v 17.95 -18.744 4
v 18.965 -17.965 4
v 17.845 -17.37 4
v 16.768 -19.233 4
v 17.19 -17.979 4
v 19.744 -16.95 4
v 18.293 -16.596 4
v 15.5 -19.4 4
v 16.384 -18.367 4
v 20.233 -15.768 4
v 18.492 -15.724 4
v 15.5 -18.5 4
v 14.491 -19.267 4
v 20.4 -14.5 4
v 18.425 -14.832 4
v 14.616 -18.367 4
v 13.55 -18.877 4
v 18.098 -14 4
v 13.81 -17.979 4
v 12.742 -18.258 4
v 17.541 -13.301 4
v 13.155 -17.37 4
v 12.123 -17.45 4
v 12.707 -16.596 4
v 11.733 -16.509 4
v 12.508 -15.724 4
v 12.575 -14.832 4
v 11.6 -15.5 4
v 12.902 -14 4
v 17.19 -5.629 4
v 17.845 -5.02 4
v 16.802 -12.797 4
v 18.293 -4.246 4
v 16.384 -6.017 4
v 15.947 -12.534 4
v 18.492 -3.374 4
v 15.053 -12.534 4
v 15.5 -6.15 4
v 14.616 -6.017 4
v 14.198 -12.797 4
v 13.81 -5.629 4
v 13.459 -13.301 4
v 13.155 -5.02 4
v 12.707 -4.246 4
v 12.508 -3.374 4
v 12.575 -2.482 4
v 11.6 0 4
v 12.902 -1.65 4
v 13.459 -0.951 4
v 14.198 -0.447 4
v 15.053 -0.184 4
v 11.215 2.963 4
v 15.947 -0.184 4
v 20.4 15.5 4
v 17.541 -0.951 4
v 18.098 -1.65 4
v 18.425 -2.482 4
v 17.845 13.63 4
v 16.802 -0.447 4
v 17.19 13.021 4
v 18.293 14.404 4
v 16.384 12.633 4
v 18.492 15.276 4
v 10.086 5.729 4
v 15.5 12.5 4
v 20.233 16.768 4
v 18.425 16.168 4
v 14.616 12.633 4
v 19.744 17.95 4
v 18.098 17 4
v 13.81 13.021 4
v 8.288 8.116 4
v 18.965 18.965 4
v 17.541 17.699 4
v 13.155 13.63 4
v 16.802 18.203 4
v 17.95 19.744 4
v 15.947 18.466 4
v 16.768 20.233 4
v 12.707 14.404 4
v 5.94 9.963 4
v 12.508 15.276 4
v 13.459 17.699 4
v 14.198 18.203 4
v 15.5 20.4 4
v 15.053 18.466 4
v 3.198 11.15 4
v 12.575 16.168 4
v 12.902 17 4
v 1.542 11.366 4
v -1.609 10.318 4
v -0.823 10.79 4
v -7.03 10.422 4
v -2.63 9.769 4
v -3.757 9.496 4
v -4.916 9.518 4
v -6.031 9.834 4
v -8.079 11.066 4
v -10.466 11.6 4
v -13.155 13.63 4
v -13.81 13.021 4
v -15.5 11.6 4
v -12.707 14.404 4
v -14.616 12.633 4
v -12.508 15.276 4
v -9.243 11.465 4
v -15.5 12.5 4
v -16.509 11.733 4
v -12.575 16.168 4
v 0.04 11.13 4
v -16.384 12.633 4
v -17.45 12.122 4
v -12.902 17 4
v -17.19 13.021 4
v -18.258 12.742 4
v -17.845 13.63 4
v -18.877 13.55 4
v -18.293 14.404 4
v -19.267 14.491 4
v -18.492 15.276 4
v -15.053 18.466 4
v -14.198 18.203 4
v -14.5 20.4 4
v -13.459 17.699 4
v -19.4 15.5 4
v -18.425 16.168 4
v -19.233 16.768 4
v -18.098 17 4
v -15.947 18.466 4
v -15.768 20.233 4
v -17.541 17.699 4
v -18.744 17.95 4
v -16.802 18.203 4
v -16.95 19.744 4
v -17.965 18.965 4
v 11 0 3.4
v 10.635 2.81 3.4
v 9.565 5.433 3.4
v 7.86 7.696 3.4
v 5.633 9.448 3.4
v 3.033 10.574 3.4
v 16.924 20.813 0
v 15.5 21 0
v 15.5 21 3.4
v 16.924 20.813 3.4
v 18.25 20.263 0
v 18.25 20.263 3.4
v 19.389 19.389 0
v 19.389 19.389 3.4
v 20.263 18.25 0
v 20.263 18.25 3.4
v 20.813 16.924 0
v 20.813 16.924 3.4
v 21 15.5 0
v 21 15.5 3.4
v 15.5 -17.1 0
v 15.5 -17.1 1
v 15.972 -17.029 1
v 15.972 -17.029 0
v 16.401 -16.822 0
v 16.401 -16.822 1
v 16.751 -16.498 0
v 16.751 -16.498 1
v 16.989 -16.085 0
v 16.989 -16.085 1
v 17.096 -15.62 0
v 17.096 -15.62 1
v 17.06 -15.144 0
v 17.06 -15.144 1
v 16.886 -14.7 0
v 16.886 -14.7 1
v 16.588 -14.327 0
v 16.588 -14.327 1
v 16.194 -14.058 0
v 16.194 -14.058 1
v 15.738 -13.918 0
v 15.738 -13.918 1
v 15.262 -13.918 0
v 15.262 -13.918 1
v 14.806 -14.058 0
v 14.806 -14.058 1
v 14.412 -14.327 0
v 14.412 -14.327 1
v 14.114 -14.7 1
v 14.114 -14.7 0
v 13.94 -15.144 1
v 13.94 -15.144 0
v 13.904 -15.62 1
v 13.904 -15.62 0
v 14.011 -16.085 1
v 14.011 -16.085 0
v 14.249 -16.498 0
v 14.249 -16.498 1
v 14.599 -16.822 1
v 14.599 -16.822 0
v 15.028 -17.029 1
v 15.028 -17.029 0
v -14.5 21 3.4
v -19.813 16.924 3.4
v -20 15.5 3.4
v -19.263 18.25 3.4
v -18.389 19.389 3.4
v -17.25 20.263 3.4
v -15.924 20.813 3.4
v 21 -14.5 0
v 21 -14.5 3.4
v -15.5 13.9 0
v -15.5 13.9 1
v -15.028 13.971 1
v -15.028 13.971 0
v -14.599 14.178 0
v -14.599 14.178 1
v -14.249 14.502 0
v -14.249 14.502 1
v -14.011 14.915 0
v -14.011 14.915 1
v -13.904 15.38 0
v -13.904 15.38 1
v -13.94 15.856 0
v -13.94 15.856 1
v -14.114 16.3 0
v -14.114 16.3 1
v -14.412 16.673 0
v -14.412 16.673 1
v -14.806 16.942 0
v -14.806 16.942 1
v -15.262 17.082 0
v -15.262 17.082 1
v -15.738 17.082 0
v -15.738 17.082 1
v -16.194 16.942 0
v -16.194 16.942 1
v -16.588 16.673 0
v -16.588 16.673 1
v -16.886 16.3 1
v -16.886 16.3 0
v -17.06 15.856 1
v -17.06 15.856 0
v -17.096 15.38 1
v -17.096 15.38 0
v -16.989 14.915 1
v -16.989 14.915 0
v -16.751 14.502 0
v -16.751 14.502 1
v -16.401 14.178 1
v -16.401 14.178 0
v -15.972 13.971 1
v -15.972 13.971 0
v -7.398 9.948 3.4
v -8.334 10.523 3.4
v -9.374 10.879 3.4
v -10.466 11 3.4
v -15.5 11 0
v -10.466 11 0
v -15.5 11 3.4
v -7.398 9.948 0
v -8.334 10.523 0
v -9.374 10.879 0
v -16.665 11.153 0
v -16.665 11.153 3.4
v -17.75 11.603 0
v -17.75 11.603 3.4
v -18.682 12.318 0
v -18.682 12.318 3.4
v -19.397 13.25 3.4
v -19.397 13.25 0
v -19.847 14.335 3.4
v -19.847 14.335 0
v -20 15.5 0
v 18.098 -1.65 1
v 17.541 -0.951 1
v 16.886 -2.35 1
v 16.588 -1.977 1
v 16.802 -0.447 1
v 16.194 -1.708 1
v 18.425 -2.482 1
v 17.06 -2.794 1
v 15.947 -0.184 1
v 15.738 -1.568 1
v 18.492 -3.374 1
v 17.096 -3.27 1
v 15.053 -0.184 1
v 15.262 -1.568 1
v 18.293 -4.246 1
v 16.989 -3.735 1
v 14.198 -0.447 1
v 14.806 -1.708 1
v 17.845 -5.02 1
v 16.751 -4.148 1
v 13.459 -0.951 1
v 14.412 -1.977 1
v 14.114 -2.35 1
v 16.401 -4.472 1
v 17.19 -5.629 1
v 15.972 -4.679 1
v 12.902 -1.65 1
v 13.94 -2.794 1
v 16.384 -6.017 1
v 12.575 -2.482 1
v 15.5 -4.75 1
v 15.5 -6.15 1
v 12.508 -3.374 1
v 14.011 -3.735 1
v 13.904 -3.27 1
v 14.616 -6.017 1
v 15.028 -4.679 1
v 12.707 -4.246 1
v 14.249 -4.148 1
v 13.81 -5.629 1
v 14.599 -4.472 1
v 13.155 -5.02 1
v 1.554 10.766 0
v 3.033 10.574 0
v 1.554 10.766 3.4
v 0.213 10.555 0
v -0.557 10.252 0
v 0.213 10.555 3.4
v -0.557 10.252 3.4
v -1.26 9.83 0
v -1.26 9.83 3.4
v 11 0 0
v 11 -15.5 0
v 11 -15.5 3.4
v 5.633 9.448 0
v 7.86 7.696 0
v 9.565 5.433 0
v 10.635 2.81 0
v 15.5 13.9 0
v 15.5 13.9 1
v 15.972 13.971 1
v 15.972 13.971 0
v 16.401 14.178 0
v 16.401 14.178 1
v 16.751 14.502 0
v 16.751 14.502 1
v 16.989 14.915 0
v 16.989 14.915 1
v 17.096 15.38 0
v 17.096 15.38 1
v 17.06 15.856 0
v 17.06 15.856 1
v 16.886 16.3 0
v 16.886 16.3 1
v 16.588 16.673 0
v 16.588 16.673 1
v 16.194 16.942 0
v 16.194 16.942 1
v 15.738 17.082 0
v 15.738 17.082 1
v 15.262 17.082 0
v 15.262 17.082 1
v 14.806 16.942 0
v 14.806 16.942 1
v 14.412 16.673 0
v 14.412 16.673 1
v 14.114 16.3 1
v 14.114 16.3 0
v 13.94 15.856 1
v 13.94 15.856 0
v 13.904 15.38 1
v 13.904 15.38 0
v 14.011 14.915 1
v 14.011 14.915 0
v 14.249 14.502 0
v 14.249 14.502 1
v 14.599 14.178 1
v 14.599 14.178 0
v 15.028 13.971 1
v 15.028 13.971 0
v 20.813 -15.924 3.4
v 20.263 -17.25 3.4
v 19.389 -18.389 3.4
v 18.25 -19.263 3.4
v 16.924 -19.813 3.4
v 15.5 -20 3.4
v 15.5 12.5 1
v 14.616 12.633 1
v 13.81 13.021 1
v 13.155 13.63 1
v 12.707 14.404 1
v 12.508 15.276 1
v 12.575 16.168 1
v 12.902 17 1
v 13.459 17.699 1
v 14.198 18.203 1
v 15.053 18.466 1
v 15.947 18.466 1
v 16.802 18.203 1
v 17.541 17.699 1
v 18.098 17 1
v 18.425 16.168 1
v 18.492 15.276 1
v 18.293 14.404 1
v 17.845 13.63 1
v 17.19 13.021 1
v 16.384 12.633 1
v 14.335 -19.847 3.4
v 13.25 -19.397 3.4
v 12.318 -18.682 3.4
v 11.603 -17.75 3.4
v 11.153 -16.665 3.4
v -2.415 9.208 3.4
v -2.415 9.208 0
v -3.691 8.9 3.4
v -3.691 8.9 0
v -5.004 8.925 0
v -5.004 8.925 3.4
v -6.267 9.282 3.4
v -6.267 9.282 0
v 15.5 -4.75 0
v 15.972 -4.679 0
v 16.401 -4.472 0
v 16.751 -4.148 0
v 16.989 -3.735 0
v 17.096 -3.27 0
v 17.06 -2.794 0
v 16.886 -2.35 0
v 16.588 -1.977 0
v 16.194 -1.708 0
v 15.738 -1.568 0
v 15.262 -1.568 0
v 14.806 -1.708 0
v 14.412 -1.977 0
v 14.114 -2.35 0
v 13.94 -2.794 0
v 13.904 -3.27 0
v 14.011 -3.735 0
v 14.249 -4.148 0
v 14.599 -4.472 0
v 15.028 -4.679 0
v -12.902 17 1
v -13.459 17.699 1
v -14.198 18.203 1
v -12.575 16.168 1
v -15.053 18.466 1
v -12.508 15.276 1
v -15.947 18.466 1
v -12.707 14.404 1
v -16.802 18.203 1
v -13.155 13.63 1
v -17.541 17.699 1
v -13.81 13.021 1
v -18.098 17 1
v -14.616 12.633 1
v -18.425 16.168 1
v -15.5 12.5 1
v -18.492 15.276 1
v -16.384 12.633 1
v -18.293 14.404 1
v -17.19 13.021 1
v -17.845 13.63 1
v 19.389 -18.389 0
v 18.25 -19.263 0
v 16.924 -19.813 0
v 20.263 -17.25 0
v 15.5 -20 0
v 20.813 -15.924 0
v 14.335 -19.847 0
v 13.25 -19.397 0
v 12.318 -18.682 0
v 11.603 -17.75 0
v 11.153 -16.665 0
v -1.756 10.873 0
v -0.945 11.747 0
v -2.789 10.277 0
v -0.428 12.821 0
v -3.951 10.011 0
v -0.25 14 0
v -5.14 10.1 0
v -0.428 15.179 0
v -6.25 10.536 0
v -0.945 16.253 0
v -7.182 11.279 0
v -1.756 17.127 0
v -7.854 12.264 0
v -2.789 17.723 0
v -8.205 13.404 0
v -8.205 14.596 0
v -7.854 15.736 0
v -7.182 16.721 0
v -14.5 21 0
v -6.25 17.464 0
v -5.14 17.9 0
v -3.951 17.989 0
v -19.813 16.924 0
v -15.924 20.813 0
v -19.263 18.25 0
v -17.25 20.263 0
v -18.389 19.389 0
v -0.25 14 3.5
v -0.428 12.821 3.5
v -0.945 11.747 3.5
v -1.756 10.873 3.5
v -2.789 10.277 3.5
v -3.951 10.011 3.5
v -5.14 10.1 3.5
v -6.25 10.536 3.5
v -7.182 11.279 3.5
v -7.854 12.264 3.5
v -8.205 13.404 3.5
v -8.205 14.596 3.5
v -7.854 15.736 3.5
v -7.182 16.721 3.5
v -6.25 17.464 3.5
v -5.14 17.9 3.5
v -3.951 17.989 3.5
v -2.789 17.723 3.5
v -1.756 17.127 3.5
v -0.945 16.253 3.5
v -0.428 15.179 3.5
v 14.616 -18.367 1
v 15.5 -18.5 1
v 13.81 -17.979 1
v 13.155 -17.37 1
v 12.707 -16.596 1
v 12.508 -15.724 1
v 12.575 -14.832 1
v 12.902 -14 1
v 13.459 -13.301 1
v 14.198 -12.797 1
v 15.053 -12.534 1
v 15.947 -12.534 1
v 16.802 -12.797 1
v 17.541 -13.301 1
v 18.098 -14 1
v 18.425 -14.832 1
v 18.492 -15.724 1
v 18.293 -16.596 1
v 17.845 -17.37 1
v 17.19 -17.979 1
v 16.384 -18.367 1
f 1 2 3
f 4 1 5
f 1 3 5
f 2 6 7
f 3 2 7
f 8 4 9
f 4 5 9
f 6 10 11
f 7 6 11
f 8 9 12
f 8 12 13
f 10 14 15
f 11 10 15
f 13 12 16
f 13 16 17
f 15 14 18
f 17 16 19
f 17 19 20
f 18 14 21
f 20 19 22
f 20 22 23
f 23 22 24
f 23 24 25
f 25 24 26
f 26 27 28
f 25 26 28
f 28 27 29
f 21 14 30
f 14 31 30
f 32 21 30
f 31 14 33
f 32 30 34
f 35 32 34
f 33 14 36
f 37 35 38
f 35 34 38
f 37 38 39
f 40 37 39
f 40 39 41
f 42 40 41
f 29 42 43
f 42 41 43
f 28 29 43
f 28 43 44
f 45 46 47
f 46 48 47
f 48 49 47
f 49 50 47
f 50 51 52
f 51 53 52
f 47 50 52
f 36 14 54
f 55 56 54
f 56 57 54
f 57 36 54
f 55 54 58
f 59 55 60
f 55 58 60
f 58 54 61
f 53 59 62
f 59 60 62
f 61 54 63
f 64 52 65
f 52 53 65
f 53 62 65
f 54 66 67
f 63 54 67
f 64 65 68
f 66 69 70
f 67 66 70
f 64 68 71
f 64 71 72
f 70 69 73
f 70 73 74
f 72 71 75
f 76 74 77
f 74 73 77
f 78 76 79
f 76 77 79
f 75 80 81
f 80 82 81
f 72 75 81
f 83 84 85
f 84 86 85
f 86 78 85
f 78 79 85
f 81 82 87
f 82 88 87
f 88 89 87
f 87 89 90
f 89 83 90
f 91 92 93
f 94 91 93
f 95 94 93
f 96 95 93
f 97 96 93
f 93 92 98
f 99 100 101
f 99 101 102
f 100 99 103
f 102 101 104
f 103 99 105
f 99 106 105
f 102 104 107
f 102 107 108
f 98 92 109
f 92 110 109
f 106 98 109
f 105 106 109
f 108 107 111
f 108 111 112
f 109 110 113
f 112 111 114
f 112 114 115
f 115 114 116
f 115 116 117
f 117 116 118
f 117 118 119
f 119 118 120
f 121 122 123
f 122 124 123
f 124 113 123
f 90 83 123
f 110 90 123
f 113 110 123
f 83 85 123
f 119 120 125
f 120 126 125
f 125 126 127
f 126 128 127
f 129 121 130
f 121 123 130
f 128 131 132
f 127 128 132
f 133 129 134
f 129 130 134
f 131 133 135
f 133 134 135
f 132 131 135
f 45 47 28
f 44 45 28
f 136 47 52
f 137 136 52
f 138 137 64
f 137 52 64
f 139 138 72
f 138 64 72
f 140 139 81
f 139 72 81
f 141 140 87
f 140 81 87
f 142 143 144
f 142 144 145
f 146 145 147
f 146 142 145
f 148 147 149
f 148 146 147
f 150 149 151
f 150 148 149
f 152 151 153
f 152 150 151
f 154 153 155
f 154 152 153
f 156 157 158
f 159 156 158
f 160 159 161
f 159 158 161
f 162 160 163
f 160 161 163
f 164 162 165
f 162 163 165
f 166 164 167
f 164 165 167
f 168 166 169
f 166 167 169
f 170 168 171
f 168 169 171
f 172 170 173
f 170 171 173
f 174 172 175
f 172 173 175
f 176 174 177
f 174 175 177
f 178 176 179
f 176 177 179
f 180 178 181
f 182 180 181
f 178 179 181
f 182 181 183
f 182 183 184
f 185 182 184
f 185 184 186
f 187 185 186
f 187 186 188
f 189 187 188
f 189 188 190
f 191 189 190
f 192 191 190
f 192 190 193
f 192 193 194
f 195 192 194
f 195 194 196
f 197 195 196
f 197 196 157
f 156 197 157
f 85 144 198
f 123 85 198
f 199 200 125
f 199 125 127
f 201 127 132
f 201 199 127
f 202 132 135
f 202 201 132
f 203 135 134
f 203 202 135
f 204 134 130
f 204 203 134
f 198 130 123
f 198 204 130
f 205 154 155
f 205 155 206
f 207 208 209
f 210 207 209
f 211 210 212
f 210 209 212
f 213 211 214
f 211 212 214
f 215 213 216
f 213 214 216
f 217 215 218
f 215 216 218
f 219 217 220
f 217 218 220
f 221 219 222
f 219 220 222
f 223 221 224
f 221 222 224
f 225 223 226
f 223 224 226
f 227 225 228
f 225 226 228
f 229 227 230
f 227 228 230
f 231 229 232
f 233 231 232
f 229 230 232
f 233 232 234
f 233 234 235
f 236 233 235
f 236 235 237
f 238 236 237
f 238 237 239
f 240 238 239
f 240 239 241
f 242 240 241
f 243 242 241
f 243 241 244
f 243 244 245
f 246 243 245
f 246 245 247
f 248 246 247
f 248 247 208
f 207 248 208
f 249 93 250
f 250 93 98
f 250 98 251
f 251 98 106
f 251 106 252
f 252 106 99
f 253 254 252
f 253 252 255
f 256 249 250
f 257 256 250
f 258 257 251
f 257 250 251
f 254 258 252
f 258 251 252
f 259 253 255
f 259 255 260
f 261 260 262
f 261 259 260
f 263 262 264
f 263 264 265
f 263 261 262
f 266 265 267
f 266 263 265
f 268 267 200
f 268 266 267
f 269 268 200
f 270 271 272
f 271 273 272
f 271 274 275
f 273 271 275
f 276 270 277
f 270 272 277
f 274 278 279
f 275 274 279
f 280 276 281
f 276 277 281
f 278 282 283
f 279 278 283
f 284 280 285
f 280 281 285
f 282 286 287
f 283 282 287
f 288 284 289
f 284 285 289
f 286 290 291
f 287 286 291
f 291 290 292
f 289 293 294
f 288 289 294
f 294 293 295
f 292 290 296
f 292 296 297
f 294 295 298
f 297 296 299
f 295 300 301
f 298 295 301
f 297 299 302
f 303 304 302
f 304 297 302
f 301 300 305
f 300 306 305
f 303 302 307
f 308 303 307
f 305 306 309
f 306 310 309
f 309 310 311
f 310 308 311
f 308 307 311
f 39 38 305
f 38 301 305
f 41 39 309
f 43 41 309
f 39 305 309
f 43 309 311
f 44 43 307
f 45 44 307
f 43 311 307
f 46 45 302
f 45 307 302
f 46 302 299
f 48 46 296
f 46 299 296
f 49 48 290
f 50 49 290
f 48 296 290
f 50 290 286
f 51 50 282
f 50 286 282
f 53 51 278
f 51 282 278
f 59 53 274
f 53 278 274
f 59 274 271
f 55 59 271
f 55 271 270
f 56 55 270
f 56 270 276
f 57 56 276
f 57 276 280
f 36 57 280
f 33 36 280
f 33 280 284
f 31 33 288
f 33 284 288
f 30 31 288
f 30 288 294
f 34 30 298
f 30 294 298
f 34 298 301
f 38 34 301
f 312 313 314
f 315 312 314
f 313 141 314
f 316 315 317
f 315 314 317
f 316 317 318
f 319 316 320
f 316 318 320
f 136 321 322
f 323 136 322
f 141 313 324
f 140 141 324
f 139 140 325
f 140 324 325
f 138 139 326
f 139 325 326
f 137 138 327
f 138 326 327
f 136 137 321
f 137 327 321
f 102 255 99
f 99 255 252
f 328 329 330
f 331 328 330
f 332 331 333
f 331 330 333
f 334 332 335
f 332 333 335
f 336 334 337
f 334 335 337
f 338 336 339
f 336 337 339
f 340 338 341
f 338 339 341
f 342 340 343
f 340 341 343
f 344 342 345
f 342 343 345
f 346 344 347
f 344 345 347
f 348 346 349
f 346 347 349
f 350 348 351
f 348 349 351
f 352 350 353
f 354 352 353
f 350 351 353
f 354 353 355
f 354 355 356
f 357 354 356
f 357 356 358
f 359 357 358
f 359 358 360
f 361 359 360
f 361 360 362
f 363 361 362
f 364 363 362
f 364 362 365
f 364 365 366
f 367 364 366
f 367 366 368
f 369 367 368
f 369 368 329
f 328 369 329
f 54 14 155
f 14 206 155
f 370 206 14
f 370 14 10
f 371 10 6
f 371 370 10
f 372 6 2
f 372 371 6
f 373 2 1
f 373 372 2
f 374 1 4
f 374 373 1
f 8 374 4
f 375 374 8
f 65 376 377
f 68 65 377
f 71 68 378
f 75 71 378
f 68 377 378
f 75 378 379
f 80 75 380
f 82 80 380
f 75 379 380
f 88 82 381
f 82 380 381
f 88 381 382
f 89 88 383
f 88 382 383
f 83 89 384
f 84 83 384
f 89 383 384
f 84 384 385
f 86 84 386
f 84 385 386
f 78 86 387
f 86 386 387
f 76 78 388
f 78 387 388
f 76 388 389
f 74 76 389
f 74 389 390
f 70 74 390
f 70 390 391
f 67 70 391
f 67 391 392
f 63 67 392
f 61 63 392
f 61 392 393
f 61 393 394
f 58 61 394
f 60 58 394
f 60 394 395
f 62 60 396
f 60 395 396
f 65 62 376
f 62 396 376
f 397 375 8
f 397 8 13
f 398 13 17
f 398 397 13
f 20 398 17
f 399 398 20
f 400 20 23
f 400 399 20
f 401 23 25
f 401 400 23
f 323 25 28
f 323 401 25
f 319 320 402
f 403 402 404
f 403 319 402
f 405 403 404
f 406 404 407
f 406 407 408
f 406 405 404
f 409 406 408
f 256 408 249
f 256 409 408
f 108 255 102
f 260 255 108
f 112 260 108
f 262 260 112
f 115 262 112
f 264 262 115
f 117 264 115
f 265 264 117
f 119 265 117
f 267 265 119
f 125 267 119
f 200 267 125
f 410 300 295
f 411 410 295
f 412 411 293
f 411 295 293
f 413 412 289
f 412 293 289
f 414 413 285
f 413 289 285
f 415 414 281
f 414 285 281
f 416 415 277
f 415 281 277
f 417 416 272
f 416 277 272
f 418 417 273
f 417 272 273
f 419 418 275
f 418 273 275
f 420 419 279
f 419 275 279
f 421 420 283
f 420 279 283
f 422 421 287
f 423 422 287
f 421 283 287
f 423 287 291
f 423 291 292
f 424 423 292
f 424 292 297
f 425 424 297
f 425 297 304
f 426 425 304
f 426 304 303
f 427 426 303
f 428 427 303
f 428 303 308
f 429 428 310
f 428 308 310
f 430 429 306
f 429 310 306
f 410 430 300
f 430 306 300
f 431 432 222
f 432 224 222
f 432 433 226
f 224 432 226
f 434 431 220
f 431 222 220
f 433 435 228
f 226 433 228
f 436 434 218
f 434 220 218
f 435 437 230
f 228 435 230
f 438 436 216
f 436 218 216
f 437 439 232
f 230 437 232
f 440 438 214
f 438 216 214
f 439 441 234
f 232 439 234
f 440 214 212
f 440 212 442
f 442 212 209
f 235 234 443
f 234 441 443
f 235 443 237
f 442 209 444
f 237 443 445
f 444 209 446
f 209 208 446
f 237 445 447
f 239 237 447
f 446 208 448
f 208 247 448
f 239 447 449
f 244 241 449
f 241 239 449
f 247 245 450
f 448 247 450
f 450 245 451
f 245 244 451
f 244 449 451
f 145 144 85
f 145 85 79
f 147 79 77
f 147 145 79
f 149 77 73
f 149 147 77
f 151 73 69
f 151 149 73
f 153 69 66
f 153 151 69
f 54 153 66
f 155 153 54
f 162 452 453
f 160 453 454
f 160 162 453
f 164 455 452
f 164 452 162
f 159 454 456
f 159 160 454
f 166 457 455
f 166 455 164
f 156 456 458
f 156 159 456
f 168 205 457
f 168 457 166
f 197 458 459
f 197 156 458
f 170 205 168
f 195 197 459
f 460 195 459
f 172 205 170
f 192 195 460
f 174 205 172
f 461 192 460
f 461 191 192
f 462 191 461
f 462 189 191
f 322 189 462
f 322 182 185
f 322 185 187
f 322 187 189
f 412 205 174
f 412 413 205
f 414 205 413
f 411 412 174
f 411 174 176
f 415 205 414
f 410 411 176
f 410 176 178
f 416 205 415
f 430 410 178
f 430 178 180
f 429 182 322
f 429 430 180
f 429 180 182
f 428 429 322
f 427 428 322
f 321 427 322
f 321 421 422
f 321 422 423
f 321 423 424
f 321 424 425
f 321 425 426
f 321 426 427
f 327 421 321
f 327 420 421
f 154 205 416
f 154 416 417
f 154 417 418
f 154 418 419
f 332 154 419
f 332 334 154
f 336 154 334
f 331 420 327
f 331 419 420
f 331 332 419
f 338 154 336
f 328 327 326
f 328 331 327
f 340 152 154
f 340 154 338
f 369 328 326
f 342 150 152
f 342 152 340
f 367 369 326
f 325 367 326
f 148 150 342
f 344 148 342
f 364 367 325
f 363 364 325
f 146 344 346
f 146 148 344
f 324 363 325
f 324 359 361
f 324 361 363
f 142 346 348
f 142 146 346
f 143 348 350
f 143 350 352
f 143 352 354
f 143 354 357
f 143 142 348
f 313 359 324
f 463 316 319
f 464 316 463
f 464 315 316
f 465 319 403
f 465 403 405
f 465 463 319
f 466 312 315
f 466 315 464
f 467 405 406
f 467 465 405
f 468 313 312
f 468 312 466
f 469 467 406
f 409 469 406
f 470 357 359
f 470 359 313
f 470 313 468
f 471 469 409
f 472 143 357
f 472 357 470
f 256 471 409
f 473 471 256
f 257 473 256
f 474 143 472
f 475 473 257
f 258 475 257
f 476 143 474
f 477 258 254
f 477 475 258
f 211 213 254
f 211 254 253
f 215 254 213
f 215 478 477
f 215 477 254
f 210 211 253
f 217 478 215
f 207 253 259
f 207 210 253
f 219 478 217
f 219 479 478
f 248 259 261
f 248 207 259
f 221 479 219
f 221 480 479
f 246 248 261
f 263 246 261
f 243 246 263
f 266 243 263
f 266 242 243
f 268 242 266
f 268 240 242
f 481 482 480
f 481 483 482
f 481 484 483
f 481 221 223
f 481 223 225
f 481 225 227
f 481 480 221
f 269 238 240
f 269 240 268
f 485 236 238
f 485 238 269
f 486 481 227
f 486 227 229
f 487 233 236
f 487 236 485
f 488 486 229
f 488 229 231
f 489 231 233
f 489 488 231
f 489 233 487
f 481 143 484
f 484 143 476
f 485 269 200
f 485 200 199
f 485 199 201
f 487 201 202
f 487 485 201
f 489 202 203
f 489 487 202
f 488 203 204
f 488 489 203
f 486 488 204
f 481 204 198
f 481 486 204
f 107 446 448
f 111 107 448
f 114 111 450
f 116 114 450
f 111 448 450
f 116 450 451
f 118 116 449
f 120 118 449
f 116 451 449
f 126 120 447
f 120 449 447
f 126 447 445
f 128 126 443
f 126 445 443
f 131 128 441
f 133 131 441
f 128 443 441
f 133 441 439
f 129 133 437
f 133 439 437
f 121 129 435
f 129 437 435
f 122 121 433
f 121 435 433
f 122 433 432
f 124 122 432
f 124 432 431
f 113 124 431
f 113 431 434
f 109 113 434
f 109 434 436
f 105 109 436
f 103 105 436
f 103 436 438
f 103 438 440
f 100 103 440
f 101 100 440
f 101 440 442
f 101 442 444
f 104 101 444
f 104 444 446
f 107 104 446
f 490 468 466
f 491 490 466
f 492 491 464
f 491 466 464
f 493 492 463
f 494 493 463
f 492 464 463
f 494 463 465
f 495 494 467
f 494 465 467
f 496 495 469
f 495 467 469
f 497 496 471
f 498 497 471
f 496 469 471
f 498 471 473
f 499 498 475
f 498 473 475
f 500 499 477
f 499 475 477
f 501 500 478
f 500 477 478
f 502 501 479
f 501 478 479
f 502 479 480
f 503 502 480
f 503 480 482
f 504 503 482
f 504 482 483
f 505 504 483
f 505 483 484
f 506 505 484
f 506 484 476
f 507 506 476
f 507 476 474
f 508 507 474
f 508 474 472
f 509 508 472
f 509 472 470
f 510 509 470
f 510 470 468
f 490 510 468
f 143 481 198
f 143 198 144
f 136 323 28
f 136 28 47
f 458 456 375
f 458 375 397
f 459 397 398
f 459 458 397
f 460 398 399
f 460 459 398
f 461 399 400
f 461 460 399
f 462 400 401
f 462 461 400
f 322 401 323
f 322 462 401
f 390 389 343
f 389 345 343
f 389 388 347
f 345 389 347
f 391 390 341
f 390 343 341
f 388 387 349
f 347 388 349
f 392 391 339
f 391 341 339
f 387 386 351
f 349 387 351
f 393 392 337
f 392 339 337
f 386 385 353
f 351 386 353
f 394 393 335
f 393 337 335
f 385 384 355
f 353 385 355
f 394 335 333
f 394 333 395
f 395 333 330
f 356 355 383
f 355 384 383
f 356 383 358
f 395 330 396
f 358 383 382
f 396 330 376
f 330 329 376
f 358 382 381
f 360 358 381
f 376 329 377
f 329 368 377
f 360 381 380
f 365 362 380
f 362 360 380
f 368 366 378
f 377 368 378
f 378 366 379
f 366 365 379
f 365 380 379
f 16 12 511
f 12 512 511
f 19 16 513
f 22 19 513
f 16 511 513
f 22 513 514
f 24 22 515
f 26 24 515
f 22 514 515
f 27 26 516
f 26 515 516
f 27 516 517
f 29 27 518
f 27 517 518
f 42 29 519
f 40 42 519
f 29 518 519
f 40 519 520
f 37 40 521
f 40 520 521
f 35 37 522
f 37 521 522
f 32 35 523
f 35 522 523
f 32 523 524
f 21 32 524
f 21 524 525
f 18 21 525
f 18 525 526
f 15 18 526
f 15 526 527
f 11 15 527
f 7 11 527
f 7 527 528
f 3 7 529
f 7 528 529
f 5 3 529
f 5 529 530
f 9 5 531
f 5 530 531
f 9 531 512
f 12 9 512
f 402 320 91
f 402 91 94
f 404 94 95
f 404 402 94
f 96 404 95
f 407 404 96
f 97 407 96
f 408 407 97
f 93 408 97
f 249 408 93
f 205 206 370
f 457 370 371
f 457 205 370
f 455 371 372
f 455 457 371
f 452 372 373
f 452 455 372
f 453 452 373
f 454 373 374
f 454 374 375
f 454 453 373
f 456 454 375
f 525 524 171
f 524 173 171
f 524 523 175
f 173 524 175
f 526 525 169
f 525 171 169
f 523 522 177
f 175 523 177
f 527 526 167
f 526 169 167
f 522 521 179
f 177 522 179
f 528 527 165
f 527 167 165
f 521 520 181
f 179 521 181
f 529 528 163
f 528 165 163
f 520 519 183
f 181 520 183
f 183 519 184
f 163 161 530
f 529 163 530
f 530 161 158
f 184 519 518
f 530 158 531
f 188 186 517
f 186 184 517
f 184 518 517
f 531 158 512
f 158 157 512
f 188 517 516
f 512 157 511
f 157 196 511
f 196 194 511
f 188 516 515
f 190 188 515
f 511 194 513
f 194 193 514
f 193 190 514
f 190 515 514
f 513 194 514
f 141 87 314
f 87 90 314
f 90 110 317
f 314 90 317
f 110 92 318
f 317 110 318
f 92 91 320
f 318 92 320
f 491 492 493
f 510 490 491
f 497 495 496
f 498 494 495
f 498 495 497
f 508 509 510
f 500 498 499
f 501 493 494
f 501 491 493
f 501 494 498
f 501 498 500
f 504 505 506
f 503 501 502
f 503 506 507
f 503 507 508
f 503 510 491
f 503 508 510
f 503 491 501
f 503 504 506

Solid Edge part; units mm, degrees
sketch "Sketch1" plane through (0, 0, 0) normal (0, 0, 1) x (1, 0, 0)
  line L0 (21, 15.5) -> (21, -14.5)
  arc A0 (15.5, -20) -> (21, -14.5) centre (15.5, -14.5) ccw
  arc A1 (11, -15.5) -> (15.5, -20) centre (15.5, -15.5) ccw
  line L1 (11, 0) -> (11, -15.5)
  arc A2 (-0.0878, 10.9996) -> (11, 0) centre (0, 0) cw
  arc A3 (-0.0878, 10.9996) -> (-8.4124, 11) centre (-4.25, 14) cw
  line L2 (-8.4124, 11) -> (-15.5, 11)
  arc A4 (-15.5, 11) -> (-20, 15.5) centre (-15.5, 15.5) cw
  arc A5 (-20, 15.5) -> (-14.5, 21) centre (-14.5, 15.5) cw
  line L3 (-14.5, 21) -> (15.5, 21)
  arc A6 (21, 15.5) -> (15.5, 21) centre (15.5, 15.5) ccw
extrude "Protrusion1" add sketch "Sketch1" along normal blind 4
fillet "Redondeo_1" radius 5 2 edges at (-0.0878, 10.9996, 2) (-8.4124, 11, 2)
sketch "Sketch2" plane through (0.5, 0.5, 0) normal (0, 0, -1) x (1, 0, 0)
  circle A0 centre (-4.75, -13.5) radius 4
extrude "VaciadoExtruido_1" cut sketch "Sketch2" against normal blind 3.5
hole "Agujero_1" at (-15.5, 15.5, 4) direction (0, 0, -1) diameter 3.2 end through all counterbore diameter 6 counterbore depth 3
hole "Hole1" at (15.5, 15.5, 4) direction (0, 0, -1) diameter 3.2 end through all counterbore diameter 6 counterbore depth 3
hole "Hole2" at (15.5, -3.15, 4) direction (0, 0, -1) diameter 3.2 end through all counterbore diameter 6 counterbore depth 3
hole "Hole3" at (15.5, -15.5, 4) direction (0, 0, -1) diameter 3.2 end through all counterbore diameter 6 counterbore depth 3
chamfer "Chaflán_1" distance 0.6 angle 45 13 edges at (0.5, 21, 4) (19.3891, 19.3891, 4) (21, 0.5, 4) (19.3891, -18.3891, 4) (12.318, -18.682, 4) (11, -7.75, 4) (8.7852, 6.6197, 4) (0.8013, 10.6942, 4) (-4.3484, 8.8701, 4) (-8.8442, 10.7298, 4) (-12.9828, 11, 4) (-18.682, 12.318, 4) (-18.3891, 19.3891, 4)
